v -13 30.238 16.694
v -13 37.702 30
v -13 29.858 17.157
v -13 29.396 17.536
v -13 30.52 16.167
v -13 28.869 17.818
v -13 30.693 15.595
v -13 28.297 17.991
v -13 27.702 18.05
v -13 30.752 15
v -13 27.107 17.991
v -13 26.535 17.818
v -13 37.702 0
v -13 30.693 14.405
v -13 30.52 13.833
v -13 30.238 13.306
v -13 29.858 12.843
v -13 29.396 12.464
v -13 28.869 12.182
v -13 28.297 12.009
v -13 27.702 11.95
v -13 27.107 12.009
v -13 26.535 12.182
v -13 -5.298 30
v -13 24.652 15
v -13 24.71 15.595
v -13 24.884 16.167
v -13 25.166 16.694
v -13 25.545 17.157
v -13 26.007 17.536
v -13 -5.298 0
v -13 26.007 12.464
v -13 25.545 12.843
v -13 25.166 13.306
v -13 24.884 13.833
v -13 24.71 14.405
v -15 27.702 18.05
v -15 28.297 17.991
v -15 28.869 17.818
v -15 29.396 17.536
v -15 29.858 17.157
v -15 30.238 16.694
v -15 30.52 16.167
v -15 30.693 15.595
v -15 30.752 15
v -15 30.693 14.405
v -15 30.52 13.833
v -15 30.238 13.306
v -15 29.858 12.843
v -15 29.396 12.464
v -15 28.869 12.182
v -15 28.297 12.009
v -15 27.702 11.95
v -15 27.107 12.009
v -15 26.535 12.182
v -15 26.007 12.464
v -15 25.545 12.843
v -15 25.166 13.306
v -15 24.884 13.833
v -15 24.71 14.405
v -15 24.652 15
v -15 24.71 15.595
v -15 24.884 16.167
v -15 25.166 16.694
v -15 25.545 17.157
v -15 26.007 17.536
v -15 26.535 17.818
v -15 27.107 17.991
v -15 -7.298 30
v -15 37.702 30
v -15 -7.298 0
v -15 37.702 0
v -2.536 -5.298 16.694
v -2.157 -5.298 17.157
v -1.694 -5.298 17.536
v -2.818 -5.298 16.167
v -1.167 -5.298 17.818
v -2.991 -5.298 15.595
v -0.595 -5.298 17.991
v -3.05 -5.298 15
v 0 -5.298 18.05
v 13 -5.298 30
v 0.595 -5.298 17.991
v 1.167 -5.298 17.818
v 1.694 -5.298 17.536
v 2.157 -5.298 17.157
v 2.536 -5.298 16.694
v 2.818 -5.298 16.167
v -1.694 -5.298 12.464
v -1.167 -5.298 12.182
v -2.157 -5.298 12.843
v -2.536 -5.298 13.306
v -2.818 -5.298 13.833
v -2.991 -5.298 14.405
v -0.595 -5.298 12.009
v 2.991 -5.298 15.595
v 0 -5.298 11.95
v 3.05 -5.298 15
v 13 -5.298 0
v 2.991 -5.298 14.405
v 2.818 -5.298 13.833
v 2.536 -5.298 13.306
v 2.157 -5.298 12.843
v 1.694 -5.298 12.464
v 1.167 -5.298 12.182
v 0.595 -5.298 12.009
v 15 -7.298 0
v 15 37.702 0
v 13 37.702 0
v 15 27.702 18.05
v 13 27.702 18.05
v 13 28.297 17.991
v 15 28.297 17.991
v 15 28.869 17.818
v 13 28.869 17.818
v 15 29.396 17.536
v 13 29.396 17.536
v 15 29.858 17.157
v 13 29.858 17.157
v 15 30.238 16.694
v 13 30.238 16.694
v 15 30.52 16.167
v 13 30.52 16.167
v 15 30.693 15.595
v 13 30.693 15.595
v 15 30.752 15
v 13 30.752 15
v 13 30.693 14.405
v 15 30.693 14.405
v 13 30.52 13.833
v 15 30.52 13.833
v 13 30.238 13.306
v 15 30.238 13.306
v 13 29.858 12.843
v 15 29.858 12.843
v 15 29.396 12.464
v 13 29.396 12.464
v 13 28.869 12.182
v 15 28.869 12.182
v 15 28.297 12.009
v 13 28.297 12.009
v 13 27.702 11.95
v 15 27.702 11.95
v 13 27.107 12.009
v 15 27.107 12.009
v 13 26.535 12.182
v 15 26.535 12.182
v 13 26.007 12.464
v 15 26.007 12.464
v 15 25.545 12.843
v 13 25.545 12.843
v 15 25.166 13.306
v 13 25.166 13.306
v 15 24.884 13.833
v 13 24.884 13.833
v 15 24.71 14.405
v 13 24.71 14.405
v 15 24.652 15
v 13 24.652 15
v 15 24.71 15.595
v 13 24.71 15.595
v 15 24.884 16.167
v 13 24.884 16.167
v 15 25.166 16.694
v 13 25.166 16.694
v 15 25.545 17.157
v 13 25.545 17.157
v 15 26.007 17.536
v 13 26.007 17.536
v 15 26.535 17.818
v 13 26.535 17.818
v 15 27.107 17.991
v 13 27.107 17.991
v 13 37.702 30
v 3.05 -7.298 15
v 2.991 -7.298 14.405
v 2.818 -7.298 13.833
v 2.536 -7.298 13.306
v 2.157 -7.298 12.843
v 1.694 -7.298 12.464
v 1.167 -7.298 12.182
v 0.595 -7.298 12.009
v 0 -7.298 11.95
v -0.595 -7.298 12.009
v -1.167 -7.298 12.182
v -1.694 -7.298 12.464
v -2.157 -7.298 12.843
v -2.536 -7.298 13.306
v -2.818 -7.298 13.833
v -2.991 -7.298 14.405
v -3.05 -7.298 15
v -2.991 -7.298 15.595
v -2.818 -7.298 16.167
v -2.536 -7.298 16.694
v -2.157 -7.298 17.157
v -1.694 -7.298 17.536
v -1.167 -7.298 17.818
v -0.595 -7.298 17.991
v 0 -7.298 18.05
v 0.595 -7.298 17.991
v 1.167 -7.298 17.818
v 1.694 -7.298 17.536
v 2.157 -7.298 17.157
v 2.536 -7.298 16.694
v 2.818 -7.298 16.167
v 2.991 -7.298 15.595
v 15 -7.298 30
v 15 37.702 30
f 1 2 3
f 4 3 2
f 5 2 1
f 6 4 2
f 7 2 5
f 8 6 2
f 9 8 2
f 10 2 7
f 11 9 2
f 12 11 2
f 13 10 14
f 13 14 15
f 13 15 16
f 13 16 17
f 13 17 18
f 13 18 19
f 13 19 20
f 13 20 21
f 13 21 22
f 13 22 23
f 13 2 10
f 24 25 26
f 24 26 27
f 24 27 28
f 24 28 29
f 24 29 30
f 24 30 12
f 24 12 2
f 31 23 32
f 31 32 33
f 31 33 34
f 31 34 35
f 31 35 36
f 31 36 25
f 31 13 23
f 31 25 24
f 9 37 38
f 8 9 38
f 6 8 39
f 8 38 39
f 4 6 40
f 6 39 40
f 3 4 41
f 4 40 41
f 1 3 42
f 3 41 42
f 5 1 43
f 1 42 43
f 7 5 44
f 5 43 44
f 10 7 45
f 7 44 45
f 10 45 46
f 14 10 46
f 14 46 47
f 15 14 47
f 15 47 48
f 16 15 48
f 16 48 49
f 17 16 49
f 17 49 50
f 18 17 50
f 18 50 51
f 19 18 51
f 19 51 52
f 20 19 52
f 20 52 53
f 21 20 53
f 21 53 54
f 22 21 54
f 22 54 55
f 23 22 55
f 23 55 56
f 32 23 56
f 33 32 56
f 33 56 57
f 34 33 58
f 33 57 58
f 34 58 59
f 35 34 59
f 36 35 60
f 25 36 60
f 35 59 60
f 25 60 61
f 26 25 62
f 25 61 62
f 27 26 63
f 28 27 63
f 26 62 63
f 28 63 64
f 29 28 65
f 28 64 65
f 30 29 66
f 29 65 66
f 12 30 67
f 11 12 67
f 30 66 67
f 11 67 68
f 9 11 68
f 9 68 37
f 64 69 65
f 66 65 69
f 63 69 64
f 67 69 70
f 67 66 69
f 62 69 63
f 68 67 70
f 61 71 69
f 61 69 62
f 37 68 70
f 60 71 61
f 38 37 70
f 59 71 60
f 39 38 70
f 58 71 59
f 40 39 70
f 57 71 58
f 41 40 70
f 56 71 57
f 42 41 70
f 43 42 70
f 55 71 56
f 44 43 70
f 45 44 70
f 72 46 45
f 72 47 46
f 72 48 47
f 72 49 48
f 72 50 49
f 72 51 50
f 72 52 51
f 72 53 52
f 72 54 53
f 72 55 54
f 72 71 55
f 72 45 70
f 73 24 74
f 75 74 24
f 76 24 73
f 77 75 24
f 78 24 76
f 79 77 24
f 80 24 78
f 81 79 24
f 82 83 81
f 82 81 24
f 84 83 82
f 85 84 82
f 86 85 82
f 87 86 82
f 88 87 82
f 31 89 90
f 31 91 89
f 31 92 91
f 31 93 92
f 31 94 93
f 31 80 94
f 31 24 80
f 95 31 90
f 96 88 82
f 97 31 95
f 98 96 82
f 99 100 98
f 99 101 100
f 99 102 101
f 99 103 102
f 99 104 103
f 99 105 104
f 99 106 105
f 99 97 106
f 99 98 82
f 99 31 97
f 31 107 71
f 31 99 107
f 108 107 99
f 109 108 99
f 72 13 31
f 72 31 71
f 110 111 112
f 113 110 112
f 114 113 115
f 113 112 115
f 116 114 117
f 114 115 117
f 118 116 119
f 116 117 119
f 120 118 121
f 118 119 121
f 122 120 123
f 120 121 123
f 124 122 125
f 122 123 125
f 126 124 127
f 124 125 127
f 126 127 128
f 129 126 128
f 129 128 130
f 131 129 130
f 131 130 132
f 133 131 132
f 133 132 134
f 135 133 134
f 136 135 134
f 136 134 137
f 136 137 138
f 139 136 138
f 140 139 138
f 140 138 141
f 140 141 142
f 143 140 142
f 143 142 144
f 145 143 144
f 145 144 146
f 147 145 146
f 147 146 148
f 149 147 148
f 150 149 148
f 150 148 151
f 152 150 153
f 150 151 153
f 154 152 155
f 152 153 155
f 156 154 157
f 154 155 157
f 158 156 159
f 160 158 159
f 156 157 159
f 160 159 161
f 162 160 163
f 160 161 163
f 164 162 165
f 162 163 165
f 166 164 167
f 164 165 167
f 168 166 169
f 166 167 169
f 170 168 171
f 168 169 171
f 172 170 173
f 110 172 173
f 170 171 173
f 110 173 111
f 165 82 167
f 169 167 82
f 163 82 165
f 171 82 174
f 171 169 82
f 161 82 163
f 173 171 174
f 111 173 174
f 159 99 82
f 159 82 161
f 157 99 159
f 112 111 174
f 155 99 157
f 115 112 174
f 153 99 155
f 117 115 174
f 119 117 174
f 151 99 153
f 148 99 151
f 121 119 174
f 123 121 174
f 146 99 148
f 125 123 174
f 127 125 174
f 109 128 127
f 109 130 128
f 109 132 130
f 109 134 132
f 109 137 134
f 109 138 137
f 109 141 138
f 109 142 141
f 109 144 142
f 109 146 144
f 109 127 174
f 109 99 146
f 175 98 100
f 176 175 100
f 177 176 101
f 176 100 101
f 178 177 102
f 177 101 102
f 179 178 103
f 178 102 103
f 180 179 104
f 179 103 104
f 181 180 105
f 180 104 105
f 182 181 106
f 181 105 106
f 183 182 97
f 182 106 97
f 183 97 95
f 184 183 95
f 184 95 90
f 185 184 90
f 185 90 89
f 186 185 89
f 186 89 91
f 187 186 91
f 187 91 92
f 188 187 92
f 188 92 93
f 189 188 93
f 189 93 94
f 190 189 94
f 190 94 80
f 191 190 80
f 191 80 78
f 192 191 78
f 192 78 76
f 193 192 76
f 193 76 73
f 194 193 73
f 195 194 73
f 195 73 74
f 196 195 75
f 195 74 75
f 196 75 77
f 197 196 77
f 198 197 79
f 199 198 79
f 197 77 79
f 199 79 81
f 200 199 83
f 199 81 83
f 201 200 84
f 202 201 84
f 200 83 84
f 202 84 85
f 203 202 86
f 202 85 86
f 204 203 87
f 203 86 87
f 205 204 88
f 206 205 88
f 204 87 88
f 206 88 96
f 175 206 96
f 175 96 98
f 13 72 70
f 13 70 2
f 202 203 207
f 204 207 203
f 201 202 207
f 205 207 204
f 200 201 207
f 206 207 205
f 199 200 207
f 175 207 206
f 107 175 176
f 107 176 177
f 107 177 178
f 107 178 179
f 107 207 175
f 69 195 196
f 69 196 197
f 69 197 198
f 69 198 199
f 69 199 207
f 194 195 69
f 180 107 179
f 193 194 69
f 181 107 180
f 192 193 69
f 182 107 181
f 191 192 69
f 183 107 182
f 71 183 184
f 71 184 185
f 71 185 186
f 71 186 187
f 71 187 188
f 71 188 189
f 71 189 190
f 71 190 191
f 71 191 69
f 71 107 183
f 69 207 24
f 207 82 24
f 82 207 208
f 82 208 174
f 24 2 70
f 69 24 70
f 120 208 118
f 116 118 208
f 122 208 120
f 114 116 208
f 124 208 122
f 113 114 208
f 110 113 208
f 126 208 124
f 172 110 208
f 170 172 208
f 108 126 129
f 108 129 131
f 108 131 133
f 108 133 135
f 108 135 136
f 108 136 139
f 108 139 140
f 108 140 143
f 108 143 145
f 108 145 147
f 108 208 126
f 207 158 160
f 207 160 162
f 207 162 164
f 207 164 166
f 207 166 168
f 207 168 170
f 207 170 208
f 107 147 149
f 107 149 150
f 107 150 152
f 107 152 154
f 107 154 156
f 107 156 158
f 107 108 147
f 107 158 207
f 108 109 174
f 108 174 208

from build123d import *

# Parameters (mm, degrees)
EXTRUDE_1_DEPTH     = 30
SKETCH_2_R          = 3.05
CUT_EXTRUDE_1_DEPTH = 30
SKETCH_3_R          = 3.05
CUT_EXTRUDE_2_DEPTH = 38


with BuildPart() as part:
    # 草图1 → 凸台-拉伸1 (new body)
    with BuildSketch(Plane.XY):
        Polygon((-15, 37.701761355), (-13, 37.701761355), (-13, -5.298238645), (13, -5.298238645), (13, 37.701761355), (15, 37.701761355), (15, -7.298238645), (-15, -7.298238645), align=None)
    extrude(amount=EXTRUDE_1_DEPTH)

    # 草图2 → 切除-拉伸1 (cut)
    with BuildSketch(Plane(origin=(0, 0, 0), x_dir=(1, 0, 0), z_dir=(0, 1, 0))):
        with Locations((0, -15)):
            Circle(SKETCH_2_R)
    extrude(amount=-CUT_EXTRUDE_1_DEPTH, mode=Mode.SUBTRACT)

    # 草图3 → 切除-拉伸2 (cut)
    with BuildSketch(Plane.ZY.offset(15)):
        with Locations((15, 27.701761355)):
            Circle(SKETCH_3_R)
    extrude(amount=-CUT_EXTRUDE_2_DEPTH, mode=Mode.SUBTRACT)


solid = part.part
